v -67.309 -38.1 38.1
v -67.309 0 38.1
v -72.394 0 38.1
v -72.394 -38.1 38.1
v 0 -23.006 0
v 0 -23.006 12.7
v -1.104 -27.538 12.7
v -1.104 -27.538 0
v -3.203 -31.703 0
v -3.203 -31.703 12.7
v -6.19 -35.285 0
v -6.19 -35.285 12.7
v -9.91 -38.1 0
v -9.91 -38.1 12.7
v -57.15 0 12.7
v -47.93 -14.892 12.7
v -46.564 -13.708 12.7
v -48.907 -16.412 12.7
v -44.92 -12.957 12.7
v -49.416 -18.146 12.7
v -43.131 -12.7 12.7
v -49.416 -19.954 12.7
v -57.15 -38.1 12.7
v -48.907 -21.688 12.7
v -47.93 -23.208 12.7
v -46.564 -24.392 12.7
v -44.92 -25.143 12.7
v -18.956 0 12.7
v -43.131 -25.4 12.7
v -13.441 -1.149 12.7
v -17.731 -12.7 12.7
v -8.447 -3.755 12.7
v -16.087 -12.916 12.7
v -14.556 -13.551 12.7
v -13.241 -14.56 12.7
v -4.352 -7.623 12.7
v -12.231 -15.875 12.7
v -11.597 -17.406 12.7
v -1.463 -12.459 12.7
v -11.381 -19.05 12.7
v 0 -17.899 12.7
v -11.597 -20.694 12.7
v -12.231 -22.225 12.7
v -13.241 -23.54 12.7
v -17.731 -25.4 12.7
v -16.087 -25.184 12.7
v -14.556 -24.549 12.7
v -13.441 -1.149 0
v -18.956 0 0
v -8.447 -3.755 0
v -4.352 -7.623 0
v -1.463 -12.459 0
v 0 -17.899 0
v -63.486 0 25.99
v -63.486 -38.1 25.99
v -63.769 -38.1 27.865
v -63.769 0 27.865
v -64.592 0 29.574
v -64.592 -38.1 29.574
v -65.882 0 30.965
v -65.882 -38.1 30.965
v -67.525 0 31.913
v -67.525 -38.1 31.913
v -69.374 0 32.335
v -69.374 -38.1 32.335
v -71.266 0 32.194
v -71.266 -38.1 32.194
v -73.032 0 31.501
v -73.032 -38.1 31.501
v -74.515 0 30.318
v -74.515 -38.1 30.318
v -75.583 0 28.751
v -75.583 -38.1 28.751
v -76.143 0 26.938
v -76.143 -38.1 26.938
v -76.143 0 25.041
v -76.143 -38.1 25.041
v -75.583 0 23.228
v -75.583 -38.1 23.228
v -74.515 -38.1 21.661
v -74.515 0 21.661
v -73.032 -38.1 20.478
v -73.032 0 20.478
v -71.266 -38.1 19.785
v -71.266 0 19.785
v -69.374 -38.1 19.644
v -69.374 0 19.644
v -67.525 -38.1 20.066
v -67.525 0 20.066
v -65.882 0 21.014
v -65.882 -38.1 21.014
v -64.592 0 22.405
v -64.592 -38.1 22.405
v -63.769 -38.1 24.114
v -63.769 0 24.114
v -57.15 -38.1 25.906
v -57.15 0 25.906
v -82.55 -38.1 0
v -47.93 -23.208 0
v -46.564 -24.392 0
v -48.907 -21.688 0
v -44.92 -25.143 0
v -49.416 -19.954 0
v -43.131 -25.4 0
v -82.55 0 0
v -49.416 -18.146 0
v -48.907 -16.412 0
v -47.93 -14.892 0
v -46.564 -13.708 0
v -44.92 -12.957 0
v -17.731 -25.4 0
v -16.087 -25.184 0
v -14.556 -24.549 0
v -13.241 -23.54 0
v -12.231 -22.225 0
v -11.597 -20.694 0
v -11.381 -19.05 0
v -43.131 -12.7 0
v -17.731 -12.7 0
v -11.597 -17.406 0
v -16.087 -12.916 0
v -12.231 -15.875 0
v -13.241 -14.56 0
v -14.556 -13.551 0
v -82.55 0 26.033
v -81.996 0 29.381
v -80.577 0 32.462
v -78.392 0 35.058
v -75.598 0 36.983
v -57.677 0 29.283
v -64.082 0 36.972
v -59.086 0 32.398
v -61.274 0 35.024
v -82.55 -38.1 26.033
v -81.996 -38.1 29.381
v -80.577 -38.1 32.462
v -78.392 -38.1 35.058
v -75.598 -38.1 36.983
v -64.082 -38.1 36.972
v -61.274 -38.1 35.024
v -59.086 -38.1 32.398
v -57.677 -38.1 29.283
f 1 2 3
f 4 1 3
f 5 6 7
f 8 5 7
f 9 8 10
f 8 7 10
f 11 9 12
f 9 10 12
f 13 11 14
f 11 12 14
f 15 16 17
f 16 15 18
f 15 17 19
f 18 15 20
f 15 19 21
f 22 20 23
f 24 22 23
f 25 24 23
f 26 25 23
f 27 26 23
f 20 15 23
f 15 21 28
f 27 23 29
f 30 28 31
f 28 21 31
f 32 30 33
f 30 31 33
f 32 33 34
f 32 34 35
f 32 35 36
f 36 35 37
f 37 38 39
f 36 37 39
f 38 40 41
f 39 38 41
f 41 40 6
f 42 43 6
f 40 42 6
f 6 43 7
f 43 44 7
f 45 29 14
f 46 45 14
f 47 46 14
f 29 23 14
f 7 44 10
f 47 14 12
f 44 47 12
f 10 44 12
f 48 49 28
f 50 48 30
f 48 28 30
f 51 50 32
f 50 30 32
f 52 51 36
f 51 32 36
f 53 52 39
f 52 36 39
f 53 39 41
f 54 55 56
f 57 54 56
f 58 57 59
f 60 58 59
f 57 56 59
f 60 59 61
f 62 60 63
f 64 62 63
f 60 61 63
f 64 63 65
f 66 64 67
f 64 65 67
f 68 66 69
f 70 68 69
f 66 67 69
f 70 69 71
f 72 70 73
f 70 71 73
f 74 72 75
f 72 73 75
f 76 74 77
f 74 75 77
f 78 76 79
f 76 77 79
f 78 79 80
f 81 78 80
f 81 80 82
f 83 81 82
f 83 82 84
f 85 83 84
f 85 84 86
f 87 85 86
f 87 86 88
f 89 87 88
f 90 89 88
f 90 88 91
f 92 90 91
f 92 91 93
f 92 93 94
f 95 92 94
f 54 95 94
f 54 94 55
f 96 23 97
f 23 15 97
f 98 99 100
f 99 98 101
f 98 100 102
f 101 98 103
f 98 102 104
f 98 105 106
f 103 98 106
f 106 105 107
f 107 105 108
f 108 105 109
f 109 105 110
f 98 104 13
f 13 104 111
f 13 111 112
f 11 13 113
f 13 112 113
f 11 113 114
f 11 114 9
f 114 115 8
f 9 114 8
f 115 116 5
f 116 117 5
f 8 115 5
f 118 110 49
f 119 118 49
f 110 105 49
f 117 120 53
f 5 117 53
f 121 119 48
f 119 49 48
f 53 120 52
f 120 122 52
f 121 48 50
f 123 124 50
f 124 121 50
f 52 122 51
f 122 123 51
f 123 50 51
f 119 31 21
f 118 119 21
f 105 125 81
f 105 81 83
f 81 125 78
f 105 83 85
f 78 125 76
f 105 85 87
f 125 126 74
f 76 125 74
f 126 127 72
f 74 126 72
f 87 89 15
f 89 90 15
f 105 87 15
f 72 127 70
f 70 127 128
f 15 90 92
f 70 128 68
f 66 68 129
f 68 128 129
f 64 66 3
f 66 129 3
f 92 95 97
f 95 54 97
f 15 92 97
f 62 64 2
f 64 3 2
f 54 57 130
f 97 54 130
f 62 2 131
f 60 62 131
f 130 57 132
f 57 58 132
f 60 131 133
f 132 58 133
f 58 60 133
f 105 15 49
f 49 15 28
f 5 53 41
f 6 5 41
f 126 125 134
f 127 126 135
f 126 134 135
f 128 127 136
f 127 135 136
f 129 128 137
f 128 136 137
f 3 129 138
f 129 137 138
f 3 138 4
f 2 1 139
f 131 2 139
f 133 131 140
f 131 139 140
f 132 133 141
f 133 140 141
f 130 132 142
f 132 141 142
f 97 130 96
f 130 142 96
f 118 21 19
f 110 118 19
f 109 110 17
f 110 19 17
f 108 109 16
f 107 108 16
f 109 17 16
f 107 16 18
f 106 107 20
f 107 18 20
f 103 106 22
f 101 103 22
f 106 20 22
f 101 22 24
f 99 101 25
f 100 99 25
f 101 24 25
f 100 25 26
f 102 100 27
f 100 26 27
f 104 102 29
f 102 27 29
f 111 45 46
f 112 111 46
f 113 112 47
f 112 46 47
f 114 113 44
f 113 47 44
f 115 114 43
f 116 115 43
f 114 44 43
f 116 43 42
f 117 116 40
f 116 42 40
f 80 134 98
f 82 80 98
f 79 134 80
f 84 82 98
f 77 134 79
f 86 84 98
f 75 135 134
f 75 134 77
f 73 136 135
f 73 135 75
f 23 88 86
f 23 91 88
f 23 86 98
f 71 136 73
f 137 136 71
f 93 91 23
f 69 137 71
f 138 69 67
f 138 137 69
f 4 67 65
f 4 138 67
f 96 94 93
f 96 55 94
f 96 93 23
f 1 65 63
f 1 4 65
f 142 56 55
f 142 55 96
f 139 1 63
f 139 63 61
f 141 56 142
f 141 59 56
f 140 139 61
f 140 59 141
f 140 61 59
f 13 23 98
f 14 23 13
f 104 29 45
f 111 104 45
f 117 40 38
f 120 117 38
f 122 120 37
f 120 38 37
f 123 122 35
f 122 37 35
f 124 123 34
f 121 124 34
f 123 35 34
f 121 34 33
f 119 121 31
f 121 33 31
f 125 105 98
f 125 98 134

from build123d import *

# Parameters (mm, degrees)
F0_W      = 82.55
F0_H      = 38.1
F1_DEPTH  = 38.1
F2_W      = 57.15
F2_H      = 25.4
F3_DEPTH  = 38.101
F4_R      = 6.3636745149
F5_DEPTH  = 38.101
F7_DEPTH  = 25.4
F9_DEPTH  = 25.4
F10_DEPTH = 63.501
F12_DEPTH = 25.4


with BuildPart() as f1:
    # F0 (on Front) → F1 (new body)
    with BuildSketch(Plane.XZ):
        with Locations((-41.275, 19.05)):
            Rectangle(F0_W, F0_H)
    extrude(amount=F1_DEPTH)

    # F2 (on face) → F3 (cut, through all)
    with BuildSketch(Plane.XZ.offset(38.1)):
        with Locations((-28.575, 25.4)):
            Rectangle(F2_W, F2_H)
    extrude(amount=-F3_DEPTH, mode=Mode.SUBTRACT)

    # F4 (on face) → F5 (cut, through all)
    with BuildSketch(Plane.XZ.offset(38.1)):
        with Locations((-69.85, 25.9895079914)):
            Circle(F4_R)
    extrude(amount=-F5_DEPTH, mode=Mode.SUBTRACT)

    # F6 (on face) → F7 (cut)
    with BuildSketch(Plane.XY.offset(12.7)):
        with BuildLine():
            ThreePointArc((-43.1306947993, -12.7), (-38.6405667387, -14.5598719395), (-36.7806947993, -19.05))
            ThreePointArc((-36.7806947993, -19.05), (-38.6405667387, -23.5401280605), (-43.1306947993, -25.4))
            Line((-43.1306947993, -25.4), (-17.7306947993, -25.4))
            ThreePointArc((-17.7306947993, -25.4), (-24.0806947993, -19.05), (-17.7306947993, -12.7))
            Line((-17.7306947993, -12.7), (-43.1306947993, -12.7))
        make_face()
        with BuildLine():
            ThreePointArc((-43.1306947993, -25.4), (-38.6405667387, -23.5401280605), (-36.7806947993, -19.05))
            ThreePointArc((-36.7806947993, -19.05), (-38.6405667387, -14.5598719395), (-43.1306947993, -12.7))
            ThreePointArc((-43.1306947993, -12.7), (-49.4806947993, -19.05), (-43.1306947993, -25.4))
        make_face()
        with BuildLine():
            ThreePointArc((-11.3806947993, -19.05), (-13.2405667387, -14.5598719395), (-17.7306947993, -12.7))
            ThreePointArc((-17.7306947993, -12.7), (-24.0806947993, -19.05), (-17.7306947993, -25.4))
            ThreePointArc((-17.7306947993, -25.4), (-13.2405667387, -23.5401280605), (-11.3806947993, -19.05))
        make_face()
    extrude(amount=-F7_DEPTH, mode=Mode.SUBTRACT)

    # F8 (on face) → F9 (join)
    with BuildSketch(Plane.XZ.offset(38.1)):
        with BuildLine():
            ThreePointArc((-67.3090244137, 38.1), (-60.0909334069, 33.7845859546), (-57.15, 25.9058457722))
            Line((-57.15, 25.9058457722), (-57.15, 38.1))
            Line((-57.15, 38.1), (-67.3090244137, 38.1))
        make_face()
        with BuildLine():
            ThreePointArc((-82.55, 26.0334052145), (-79.5712875843, 33.8335010618), (-72.3941565633, 38.1))
            Line((-72.3941565633, 38.1), (-82.55, 38.1))
            Line((-82.55, 38.1), (-82.55, 26.0334052145))
        make_face()
    extrude(amount=F9_DEPTH)

    # F10 (cut, through all): faces of the model
    f10_faces = [f1.faces().sort_by_distance(p)[0] for p in [
        (-59.7492259595, -63.5, 35.2812720031),
        (-79.9507979007, -63.5, 35.2852151474),
    ]]
    extrude(f10_faces, amount=-F10_DEPTH, mode=Mode.SUBTRACT)

    # F11 (on face) → F12 (cut)
    with BuildSketch(Plane.XY.offset(12.7)):
        with BuildLine():
            ThreePointArc((-18.9558640122, 0), (-6.26601343, -5.5476288842), (0, -17.8985628462))
            Line((0, -17.8985628462), (0, 0))
            Line((0, 0), (-18.9558640122, 0))
        make_face()
        with BuildLine():
            ThreePointArc((0, -23.0064517831), (-3.2034542821, -31.7030229504), (-9.9095078185, -38.1))
            Line((-9.9095078185, -38.1), (0, -38.1))
            Line((0, -38.1), (0, -23.0064517831))
        make_face()
    extrude(amount=-F12_DEPTH, mode=Mode.SUBTRACT)


solid = f1.part
